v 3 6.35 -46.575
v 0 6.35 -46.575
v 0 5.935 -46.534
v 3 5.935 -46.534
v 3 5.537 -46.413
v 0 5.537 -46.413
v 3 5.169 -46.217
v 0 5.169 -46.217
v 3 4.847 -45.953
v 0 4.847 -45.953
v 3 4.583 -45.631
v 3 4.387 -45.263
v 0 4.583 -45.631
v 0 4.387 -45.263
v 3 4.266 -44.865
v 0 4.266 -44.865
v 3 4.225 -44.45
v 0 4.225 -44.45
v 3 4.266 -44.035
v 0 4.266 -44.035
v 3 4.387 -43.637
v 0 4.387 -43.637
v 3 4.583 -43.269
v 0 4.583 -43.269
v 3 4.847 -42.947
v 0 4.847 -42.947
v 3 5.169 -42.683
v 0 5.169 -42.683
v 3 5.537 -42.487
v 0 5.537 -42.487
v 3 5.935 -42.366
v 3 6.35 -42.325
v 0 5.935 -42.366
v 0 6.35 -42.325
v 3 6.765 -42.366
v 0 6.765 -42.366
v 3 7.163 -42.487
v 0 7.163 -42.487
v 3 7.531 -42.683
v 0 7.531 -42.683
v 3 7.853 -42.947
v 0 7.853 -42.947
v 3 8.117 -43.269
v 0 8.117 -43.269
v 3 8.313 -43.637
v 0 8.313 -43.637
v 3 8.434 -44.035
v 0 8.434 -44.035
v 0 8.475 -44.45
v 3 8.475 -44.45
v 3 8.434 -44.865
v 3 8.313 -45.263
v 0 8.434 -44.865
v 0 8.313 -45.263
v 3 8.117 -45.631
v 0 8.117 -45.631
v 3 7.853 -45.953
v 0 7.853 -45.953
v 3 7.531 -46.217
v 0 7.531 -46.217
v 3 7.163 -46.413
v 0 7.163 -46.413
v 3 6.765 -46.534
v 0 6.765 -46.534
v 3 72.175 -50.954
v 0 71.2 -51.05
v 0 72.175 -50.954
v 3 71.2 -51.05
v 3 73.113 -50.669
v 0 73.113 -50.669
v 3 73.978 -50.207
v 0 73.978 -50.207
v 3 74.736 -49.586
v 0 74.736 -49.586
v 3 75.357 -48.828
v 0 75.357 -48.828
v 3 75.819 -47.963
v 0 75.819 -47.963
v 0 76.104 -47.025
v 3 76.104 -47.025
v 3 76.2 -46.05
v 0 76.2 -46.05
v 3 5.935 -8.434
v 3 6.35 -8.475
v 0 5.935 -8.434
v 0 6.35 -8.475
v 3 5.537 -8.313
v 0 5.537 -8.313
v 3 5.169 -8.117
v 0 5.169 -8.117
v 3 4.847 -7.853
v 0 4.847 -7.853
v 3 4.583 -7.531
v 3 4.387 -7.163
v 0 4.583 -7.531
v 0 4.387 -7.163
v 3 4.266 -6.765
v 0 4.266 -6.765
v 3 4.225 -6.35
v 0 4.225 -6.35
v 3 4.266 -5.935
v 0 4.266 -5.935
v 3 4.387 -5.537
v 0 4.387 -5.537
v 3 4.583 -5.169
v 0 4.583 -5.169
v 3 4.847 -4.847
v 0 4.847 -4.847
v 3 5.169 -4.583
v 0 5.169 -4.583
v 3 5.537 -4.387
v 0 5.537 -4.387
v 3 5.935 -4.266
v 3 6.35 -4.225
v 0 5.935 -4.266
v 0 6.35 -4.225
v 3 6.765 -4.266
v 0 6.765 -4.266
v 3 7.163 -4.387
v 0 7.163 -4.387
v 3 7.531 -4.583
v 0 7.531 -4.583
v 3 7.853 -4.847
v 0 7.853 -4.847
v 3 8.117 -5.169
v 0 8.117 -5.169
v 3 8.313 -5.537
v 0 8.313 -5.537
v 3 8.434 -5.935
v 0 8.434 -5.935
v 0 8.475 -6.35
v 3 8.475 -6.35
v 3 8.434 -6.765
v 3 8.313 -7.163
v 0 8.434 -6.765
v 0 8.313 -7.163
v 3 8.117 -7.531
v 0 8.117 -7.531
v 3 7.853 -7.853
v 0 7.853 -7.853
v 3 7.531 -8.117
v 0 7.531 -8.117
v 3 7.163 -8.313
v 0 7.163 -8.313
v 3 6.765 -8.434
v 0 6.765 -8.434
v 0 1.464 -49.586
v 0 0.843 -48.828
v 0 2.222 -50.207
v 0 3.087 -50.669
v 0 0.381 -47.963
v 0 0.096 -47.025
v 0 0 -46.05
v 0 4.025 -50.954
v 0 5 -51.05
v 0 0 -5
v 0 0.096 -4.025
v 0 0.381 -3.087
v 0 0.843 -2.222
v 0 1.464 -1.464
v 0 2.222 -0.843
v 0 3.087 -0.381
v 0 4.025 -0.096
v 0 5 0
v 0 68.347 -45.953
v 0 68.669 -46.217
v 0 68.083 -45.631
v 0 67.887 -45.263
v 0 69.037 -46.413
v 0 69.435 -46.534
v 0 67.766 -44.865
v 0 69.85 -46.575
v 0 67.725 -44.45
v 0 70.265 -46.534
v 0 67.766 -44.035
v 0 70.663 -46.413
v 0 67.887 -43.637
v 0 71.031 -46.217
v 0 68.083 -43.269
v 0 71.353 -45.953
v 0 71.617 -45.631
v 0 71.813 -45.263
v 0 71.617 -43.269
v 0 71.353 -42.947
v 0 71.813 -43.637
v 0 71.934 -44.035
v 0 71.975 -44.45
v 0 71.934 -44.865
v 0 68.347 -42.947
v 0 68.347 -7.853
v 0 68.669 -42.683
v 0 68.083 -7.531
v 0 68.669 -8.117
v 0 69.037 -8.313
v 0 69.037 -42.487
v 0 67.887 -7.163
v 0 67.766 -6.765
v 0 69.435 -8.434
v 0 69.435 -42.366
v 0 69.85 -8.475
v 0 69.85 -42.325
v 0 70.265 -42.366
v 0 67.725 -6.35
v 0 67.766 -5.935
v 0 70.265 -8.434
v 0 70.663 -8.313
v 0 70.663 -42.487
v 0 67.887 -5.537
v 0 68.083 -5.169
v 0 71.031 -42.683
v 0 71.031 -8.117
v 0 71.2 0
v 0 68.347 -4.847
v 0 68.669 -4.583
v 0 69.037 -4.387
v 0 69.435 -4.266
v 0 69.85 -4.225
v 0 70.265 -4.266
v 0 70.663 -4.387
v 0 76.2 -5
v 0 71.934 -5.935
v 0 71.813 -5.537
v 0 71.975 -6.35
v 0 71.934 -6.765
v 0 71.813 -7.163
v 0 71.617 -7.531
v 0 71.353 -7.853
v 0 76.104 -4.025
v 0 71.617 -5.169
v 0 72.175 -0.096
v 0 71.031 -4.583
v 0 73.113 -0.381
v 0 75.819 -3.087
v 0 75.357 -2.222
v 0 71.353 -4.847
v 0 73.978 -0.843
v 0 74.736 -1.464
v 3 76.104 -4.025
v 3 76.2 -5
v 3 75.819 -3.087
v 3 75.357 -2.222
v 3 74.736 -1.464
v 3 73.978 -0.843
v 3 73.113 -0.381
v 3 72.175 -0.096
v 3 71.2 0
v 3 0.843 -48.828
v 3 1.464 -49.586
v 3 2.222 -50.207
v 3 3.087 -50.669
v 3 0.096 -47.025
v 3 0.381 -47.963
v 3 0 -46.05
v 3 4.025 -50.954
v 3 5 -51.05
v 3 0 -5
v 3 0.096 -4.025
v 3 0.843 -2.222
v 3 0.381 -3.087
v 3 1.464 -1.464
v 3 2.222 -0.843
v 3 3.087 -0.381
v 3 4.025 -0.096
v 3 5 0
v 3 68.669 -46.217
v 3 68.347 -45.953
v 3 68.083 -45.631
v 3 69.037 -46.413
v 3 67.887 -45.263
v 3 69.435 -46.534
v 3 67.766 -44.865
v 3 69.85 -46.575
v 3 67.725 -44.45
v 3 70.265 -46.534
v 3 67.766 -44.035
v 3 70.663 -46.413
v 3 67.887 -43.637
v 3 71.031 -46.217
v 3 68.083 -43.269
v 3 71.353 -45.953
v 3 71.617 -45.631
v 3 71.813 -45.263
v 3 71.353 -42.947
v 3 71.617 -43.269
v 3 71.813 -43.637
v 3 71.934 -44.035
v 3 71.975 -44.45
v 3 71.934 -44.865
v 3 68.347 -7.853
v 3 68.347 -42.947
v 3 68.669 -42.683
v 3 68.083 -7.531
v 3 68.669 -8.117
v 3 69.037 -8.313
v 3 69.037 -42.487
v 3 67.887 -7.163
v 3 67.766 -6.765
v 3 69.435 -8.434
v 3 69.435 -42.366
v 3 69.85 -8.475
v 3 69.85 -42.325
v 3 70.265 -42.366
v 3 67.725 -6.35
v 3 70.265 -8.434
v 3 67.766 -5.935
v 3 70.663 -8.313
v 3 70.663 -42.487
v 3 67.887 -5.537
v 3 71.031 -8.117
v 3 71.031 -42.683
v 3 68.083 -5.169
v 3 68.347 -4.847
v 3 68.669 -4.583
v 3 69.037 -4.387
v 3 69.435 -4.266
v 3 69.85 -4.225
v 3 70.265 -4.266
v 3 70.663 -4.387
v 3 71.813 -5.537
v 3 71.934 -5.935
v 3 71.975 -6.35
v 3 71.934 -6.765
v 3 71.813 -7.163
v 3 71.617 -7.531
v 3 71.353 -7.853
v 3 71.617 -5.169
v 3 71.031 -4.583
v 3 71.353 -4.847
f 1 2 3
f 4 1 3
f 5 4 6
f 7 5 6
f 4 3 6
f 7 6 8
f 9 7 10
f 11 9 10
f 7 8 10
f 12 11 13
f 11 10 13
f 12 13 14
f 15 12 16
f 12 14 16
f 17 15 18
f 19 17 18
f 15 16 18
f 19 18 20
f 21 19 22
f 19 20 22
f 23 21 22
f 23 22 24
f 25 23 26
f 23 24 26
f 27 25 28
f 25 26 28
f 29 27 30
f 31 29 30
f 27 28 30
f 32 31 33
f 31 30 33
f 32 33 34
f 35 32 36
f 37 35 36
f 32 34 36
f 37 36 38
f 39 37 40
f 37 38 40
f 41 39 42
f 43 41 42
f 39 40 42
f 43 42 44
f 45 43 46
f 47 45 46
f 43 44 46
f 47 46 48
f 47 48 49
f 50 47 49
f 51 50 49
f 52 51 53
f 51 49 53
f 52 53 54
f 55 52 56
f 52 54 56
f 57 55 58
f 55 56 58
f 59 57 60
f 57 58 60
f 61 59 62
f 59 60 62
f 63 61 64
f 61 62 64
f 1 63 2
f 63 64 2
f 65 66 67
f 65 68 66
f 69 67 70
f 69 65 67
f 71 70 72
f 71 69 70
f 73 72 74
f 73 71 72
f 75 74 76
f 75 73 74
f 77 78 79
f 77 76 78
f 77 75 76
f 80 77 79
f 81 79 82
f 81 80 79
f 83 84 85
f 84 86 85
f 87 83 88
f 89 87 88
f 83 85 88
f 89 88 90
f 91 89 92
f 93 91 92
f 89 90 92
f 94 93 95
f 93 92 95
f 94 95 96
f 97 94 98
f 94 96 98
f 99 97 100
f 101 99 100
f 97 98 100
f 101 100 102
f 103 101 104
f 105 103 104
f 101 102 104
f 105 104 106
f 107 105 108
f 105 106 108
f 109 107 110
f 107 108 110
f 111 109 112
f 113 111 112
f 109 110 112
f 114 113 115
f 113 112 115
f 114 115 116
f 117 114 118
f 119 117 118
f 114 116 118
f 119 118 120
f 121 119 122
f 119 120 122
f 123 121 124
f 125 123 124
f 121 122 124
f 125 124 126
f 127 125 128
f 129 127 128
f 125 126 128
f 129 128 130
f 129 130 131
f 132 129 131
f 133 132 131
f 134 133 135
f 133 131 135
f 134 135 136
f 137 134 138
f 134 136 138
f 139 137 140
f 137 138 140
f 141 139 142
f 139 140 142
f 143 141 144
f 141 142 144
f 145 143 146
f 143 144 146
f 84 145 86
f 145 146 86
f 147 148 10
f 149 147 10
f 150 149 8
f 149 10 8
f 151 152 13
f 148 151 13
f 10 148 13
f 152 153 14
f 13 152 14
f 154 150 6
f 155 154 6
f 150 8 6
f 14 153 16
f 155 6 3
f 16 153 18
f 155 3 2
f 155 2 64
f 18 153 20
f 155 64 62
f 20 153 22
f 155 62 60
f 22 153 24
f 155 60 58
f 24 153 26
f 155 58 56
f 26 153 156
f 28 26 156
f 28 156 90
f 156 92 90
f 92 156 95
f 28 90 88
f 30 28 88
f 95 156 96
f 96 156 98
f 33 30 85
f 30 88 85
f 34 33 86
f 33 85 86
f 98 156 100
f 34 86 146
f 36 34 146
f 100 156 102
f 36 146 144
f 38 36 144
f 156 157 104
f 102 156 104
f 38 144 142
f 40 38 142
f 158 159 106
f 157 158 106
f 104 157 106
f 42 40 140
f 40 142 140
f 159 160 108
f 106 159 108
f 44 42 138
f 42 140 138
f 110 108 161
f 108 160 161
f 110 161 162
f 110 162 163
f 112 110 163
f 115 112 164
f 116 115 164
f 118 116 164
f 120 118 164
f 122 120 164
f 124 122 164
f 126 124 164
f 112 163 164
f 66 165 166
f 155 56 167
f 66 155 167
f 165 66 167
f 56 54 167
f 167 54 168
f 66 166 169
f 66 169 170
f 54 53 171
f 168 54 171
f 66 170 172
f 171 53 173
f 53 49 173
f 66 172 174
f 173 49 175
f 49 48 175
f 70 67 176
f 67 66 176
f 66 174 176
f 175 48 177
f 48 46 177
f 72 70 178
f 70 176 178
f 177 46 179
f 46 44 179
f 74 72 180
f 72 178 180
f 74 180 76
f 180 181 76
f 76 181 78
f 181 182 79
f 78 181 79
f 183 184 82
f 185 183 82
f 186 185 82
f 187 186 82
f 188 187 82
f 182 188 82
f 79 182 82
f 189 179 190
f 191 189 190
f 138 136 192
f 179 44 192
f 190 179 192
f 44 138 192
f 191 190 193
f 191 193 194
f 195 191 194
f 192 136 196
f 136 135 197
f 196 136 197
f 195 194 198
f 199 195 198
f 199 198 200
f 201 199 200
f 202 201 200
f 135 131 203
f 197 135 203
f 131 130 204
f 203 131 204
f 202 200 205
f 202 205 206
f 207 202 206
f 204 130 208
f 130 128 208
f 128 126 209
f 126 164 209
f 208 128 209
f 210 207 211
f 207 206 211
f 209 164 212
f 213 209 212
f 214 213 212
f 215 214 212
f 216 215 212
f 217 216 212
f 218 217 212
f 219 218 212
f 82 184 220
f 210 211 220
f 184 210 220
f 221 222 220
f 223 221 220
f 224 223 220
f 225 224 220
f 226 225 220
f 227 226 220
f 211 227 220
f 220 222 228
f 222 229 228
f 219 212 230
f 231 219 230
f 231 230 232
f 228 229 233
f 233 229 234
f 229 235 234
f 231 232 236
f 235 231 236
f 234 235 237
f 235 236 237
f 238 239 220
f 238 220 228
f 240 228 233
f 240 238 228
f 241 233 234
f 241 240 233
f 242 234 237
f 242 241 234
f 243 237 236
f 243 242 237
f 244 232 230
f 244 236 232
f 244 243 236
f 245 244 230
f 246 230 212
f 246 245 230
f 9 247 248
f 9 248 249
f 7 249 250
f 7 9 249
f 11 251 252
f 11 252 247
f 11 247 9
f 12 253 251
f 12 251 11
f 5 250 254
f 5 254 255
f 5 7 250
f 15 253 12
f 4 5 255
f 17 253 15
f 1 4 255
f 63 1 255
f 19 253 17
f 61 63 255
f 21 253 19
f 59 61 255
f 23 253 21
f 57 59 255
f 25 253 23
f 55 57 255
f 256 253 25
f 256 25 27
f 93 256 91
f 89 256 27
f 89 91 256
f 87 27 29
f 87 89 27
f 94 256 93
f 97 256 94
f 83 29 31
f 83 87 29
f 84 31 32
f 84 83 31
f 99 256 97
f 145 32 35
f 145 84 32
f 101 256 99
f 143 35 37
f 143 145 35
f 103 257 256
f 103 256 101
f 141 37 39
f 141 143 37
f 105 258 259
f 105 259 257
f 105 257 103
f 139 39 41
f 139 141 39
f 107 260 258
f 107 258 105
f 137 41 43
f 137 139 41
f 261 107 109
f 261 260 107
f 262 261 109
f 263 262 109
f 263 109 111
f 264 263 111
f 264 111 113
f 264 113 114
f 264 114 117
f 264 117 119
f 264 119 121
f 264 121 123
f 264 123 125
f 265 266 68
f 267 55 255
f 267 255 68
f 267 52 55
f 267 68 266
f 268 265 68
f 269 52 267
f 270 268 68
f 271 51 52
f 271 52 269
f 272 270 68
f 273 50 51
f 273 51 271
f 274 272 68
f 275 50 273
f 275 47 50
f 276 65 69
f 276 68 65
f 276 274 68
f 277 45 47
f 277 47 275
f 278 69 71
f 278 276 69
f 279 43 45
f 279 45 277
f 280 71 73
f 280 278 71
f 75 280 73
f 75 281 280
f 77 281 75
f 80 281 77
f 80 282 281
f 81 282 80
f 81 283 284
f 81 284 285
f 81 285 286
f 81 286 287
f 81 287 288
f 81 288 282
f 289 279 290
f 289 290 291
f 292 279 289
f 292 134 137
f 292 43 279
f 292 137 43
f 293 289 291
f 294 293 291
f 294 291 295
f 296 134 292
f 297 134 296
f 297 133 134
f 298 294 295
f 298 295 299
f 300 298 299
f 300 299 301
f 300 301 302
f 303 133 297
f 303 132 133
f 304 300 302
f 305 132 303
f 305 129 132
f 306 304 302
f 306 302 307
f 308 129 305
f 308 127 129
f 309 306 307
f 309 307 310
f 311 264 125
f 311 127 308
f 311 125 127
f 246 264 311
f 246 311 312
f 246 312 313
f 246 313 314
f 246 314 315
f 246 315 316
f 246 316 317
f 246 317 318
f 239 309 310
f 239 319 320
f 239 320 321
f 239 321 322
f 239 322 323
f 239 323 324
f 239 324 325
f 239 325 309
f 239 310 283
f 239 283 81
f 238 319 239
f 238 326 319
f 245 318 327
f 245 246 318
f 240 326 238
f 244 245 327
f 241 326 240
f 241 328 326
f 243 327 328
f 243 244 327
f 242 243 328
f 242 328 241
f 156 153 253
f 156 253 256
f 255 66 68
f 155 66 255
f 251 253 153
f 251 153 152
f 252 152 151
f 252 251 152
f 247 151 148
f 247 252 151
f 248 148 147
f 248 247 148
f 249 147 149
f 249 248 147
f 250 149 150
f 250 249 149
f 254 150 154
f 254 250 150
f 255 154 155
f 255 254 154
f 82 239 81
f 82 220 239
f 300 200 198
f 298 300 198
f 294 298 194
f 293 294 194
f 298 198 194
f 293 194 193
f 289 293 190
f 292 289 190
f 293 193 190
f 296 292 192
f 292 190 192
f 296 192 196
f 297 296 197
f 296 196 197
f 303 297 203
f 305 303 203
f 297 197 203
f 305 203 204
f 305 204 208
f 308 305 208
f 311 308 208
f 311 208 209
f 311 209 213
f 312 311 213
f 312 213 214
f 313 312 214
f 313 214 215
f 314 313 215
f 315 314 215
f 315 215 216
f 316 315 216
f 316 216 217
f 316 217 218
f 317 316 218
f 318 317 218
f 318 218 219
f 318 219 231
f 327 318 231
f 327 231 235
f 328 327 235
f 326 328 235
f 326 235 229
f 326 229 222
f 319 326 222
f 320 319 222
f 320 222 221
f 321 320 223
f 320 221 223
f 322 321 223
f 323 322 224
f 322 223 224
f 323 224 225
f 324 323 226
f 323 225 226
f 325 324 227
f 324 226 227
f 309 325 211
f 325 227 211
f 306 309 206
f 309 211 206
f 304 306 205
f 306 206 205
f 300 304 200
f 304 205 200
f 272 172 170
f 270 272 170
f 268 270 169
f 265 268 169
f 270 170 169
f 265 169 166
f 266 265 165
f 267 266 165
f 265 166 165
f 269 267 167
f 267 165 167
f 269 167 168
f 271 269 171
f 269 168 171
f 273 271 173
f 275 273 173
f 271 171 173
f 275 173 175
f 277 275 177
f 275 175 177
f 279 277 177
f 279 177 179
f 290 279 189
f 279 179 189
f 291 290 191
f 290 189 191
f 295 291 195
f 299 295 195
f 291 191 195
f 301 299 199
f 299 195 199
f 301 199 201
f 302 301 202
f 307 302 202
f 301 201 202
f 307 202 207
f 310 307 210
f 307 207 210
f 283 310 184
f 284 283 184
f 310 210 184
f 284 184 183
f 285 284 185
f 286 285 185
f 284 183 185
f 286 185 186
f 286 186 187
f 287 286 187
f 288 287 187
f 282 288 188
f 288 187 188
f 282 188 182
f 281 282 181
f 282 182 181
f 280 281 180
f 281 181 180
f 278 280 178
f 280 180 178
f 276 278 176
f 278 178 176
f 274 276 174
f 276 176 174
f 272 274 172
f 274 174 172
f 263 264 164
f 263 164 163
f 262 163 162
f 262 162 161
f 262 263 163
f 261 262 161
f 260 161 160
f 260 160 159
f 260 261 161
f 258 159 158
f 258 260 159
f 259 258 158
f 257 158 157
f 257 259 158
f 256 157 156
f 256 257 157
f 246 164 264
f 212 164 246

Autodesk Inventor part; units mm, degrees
sketch "Body Sketch" plane through (0, 0, 0) normal (1, 0, 0) x (0, 1, 0)
  line L0 (0, 0) -> (76.2, 0)
  line L1 (76.2, 0) -> (76.2, -51.05)
  line L2 (76.2, -51.05) -> (0, -51.05)
  line L3 (0, -51.05) -> (0, 0)
  dimension "d2" = 76.2
  dimension "d3" = 51.05
extrude "Body Extrude" add sketch "Body Sketch" along normal blind 3
ref_plane "Work Plane1" through (0, 38.1, -51.05) normal (0, -1, 0) x (1, 0, 0)
ref_plane "Work Plane2" through (0, 0, -25.525) normal (0, 0, 1) x (1, 0, 0)
ref_plane "Work Plane3" through (0, 0, 0) normal (0, -0.7071, -0.7071) x (1, 0, 0)
ref_plane "Work Plane4" through (0, 76.2, 0) normal (0, 0.7071, -0.7071) x (-1, 0, 0)
sketch "Hole Sketch" plane through (3, 0, 0) normal (1, 0, 0) x (0, 0, -1)
  line L0 (0, 0) -> (6.35, 0) construction
  line L1 (6.35, 0) -> (6.35, 6.35) construction
  line L2 (6.35, 6.35) -> (0, 6.35) construction
  line L3 (0, 6.35) -> (0, 0) construction
  point P0 (44.45, 6.35)
  point P1 (-19.2059, 16.3555)
  point P2 (6.35, 69.85)
  point P3 (44.45, 69.85)
  dimension "d4" = 6.35
  dimension "d55" = 38.1
  dimension "d56" = 63.5
hole "Hole" at (3, 6.35, -6.35) at (3, 69.85, -6.35) at (3, 69.85, -44.45) at (3, 6.35, -44.45) direction (-1, 0, 0) diameter 4.25 end through all
fillet "Fillet2" radius 5 4 edges at (1.5, 76.2, 0) (1.5, 0, 0) (1.5, 76.2, -51.05) (1.5, 0, -51.05)
equation "\"d54\" = FilletRadius"
equation "\"d4\" = 0.5 * GridSpacing"
equation "\"d5\" = HoleDiam"
equation "\"Thickness\" = 3"
equation "\"GridSpacing\" = 12.7"
equation "\"HoleDiam\" = 4.25"
equation "\"FilletRadius\" = 5"
properties part number "Rotary Actuator Platform Design 2" material "Acetal Resin, Black"
